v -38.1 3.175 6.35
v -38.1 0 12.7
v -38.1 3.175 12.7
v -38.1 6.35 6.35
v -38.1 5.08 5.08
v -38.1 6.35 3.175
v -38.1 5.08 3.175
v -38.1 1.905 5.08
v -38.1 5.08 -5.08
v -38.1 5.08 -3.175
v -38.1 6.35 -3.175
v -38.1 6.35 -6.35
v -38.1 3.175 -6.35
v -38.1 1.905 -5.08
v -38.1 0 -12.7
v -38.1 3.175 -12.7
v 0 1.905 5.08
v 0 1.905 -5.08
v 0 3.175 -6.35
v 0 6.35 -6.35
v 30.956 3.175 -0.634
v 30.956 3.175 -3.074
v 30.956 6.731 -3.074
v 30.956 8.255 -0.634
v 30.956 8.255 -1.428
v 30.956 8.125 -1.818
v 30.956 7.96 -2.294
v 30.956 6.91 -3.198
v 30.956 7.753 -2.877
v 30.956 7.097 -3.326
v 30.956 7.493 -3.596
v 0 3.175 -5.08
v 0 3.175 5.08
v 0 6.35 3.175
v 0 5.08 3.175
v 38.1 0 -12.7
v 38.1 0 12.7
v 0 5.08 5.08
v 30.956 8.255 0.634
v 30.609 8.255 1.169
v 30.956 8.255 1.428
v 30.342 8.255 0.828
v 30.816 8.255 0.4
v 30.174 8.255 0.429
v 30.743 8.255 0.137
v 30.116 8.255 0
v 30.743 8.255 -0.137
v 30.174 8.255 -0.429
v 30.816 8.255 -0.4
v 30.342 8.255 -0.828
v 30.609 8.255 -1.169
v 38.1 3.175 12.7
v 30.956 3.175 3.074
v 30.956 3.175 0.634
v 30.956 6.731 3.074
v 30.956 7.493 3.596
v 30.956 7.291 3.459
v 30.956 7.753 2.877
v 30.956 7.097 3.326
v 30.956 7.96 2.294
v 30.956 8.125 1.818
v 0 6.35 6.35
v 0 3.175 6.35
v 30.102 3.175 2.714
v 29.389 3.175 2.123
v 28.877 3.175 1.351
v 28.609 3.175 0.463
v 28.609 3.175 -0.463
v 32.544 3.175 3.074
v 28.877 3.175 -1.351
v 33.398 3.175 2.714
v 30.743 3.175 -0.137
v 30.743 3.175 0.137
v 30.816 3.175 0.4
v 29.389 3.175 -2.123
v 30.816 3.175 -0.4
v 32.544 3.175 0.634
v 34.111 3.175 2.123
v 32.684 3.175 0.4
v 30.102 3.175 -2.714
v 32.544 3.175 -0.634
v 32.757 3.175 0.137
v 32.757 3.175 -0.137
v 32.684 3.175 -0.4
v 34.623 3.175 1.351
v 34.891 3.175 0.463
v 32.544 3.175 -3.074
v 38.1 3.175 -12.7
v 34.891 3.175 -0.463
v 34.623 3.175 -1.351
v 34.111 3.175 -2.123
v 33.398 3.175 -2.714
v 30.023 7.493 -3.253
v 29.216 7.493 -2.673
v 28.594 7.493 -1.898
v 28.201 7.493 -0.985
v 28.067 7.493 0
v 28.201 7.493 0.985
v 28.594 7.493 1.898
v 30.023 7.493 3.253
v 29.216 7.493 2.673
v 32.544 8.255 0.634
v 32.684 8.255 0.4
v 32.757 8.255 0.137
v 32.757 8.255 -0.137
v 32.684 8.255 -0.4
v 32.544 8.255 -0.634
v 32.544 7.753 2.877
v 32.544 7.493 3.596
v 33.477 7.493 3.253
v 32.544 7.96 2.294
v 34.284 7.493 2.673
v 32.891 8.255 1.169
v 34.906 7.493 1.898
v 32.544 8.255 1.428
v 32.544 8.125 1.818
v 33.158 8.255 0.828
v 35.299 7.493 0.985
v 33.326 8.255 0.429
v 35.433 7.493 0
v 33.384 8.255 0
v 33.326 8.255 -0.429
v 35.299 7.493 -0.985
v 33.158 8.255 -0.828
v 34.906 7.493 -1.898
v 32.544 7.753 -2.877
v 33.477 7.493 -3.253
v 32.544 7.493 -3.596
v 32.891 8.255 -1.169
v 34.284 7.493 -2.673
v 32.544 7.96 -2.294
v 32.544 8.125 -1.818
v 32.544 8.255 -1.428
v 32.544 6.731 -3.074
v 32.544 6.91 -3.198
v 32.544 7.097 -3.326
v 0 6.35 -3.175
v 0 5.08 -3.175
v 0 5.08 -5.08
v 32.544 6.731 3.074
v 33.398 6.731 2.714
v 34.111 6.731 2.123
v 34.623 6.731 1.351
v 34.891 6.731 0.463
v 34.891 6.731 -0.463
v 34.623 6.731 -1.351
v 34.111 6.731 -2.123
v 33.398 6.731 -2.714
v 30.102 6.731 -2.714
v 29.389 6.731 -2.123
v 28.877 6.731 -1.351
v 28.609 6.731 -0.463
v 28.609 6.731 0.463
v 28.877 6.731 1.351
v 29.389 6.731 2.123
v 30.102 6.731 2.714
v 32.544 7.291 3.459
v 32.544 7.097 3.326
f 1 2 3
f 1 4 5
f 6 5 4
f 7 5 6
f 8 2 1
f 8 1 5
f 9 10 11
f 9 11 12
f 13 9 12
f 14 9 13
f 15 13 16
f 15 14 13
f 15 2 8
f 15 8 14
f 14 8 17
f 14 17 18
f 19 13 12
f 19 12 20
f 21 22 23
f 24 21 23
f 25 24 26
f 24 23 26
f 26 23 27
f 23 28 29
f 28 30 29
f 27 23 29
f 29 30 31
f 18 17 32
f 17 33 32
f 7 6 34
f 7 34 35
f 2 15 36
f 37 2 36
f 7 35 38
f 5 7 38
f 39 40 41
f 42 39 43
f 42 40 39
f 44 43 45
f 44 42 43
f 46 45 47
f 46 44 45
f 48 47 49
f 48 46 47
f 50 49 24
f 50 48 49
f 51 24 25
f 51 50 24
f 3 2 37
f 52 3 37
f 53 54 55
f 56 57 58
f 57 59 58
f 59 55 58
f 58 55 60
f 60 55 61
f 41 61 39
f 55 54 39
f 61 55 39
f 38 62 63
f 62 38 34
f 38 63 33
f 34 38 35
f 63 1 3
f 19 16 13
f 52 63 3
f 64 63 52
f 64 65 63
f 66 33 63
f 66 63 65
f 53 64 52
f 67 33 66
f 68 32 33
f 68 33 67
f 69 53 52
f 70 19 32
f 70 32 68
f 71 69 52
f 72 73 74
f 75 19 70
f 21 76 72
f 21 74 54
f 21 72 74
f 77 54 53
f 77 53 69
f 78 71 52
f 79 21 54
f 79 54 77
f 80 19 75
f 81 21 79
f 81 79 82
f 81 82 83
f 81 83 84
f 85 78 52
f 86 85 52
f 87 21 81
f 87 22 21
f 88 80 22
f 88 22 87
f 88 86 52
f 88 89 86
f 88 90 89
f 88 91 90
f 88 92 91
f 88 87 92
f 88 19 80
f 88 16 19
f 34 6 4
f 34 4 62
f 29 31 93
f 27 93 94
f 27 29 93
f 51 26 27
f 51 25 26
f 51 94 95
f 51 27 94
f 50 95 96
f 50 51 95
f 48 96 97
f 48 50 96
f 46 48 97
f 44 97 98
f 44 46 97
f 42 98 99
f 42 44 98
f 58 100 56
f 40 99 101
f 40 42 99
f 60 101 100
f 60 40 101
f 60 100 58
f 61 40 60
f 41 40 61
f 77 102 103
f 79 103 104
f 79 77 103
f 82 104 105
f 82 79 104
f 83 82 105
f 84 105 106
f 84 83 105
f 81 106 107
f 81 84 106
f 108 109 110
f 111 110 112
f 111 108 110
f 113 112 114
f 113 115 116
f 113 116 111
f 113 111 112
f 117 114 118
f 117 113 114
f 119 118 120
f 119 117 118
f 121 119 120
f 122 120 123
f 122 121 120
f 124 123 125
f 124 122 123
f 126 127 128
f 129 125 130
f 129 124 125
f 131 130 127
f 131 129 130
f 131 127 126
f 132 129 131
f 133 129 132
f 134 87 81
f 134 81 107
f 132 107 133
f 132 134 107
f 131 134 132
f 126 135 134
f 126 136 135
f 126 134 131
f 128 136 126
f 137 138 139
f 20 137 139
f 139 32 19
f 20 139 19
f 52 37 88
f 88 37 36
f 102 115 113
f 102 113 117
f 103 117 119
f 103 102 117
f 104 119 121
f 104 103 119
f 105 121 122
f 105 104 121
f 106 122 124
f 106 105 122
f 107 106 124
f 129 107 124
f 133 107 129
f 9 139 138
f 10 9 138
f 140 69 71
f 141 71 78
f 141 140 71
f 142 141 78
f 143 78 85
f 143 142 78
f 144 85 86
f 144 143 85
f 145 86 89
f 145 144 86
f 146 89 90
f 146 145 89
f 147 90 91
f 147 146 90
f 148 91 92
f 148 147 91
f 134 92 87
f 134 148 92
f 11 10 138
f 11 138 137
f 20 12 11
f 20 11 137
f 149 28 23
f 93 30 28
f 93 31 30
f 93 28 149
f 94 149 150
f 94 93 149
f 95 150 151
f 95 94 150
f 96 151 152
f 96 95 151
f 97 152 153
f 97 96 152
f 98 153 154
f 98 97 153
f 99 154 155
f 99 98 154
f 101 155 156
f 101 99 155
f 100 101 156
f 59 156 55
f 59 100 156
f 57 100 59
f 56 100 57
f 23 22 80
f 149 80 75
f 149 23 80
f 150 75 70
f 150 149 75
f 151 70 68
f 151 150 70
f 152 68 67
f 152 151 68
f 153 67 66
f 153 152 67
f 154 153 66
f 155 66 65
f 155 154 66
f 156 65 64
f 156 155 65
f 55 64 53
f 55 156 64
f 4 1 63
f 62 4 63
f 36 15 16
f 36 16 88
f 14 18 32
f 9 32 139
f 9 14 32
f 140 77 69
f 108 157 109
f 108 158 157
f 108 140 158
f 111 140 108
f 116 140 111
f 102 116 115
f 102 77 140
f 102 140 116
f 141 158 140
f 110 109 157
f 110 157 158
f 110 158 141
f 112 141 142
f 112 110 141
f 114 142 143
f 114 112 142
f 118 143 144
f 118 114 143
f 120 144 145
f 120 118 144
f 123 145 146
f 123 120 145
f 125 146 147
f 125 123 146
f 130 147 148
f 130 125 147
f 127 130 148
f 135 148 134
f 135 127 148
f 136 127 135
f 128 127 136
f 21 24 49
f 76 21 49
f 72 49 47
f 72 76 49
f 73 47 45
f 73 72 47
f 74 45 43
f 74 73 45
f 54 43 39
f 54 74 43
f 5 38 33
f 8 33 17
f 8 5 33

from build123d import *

# Parameters (mm, degrees)
SKETCH3_W               = 76.2
SKETCH3_H               = 25.4
BOSS_EXTRUDE1_DEPTH     = 3.175
SKETCH4_W               = 38.1
SKETCH4_H               = 12.7
BOSS_EXTRUDE2_DEPTH     = 3.175
CUT_EXTRUDE1_DEPTH      = 38.1
CUT_EXTRUDE3_DEPTH      = 42.000549082
CUT_EXTRUDE3_DEPTH_BACK = 42.000549082
SKETCH12_W              = 1.5875
SKETCH12_H              = 10.16


with BuildPart() as part:
    # Sketch3 → Boss-Extrude1 (new body)
    with BuildSketch(Plane(origin=(0, 0, 0), x_dir=(1, 0, 0), z_dir=(0, 1, 0))):
        Rectangle(SKETCH3_W, SKETCH3_H)
    extrude(amount=BOSS_EXTRUDE1_DEPTH)

    # Sketch4 → Boss-Extrude2 (add)
    with BuildSketch(Plane(origin=(0, 3.175, 0), x_dir=(1, 0, 0), z_dir=(0, 1, 0))):
        with Locations((-19.05, 0)):
            Rectangle(SKETCH4_W, SKETCH4_H)
    extrude(amount=BOSS_EXTRUDE2_DEPTH)

    # Sketch6 → Cut-Extrude1 (cut)
    with BuildSketch(Plane.ZY.offset(38.1)):
        Polygon((-5.08, 1.905), (-5.08, 5.08), (-3.175, 5.08), (-3.175, 6.35), (3.175, 6.35), (3.175, 5.08), (5.08, 5.08), (5.08, 1.905), align=None)
    extrude(amount=-CUT_EXTRUDE1_DEPTH, mode=Mode.SUBTRACT)

    # Sketch11 → Revolve1 (revolve)
    with BuildSketch(Plane.XY, mode=Mode.PRIVATE) as revolve1_sk:
        Polygon((30.734, 3.175), (28.575, 3.175), (28.575, 6.731), (28.067, 7.493), (30.116415016, 8.255), (30.734, 8.255), align=None)
    revolve(revolve1_sk.sketch.rotate(Axis((31.75, 3.175, 0), (0, 1, 0)), 270), axis=Axis((31.75, 3.175, 0), (0, 1, 0)))

    # Sketch12 → Cut-Extrude3 (cut, two sides: drawn at the far end of the back side and taken through both)
    with BuildSketch(Plane.XY.offset(-CUT_EXTRUDE3_DEPTH_BACK)):
        with Locations((31.75, 8.255)):
            Rectangle(SKETCH12_W, SKETCH12_H)
    extrude(amount=CUT_EXTRUDE3_DEPTH + CUT_EXTRUDE3_DEPTH_BACK, mode=Mode.SUBTRACT)


solid = part.part
